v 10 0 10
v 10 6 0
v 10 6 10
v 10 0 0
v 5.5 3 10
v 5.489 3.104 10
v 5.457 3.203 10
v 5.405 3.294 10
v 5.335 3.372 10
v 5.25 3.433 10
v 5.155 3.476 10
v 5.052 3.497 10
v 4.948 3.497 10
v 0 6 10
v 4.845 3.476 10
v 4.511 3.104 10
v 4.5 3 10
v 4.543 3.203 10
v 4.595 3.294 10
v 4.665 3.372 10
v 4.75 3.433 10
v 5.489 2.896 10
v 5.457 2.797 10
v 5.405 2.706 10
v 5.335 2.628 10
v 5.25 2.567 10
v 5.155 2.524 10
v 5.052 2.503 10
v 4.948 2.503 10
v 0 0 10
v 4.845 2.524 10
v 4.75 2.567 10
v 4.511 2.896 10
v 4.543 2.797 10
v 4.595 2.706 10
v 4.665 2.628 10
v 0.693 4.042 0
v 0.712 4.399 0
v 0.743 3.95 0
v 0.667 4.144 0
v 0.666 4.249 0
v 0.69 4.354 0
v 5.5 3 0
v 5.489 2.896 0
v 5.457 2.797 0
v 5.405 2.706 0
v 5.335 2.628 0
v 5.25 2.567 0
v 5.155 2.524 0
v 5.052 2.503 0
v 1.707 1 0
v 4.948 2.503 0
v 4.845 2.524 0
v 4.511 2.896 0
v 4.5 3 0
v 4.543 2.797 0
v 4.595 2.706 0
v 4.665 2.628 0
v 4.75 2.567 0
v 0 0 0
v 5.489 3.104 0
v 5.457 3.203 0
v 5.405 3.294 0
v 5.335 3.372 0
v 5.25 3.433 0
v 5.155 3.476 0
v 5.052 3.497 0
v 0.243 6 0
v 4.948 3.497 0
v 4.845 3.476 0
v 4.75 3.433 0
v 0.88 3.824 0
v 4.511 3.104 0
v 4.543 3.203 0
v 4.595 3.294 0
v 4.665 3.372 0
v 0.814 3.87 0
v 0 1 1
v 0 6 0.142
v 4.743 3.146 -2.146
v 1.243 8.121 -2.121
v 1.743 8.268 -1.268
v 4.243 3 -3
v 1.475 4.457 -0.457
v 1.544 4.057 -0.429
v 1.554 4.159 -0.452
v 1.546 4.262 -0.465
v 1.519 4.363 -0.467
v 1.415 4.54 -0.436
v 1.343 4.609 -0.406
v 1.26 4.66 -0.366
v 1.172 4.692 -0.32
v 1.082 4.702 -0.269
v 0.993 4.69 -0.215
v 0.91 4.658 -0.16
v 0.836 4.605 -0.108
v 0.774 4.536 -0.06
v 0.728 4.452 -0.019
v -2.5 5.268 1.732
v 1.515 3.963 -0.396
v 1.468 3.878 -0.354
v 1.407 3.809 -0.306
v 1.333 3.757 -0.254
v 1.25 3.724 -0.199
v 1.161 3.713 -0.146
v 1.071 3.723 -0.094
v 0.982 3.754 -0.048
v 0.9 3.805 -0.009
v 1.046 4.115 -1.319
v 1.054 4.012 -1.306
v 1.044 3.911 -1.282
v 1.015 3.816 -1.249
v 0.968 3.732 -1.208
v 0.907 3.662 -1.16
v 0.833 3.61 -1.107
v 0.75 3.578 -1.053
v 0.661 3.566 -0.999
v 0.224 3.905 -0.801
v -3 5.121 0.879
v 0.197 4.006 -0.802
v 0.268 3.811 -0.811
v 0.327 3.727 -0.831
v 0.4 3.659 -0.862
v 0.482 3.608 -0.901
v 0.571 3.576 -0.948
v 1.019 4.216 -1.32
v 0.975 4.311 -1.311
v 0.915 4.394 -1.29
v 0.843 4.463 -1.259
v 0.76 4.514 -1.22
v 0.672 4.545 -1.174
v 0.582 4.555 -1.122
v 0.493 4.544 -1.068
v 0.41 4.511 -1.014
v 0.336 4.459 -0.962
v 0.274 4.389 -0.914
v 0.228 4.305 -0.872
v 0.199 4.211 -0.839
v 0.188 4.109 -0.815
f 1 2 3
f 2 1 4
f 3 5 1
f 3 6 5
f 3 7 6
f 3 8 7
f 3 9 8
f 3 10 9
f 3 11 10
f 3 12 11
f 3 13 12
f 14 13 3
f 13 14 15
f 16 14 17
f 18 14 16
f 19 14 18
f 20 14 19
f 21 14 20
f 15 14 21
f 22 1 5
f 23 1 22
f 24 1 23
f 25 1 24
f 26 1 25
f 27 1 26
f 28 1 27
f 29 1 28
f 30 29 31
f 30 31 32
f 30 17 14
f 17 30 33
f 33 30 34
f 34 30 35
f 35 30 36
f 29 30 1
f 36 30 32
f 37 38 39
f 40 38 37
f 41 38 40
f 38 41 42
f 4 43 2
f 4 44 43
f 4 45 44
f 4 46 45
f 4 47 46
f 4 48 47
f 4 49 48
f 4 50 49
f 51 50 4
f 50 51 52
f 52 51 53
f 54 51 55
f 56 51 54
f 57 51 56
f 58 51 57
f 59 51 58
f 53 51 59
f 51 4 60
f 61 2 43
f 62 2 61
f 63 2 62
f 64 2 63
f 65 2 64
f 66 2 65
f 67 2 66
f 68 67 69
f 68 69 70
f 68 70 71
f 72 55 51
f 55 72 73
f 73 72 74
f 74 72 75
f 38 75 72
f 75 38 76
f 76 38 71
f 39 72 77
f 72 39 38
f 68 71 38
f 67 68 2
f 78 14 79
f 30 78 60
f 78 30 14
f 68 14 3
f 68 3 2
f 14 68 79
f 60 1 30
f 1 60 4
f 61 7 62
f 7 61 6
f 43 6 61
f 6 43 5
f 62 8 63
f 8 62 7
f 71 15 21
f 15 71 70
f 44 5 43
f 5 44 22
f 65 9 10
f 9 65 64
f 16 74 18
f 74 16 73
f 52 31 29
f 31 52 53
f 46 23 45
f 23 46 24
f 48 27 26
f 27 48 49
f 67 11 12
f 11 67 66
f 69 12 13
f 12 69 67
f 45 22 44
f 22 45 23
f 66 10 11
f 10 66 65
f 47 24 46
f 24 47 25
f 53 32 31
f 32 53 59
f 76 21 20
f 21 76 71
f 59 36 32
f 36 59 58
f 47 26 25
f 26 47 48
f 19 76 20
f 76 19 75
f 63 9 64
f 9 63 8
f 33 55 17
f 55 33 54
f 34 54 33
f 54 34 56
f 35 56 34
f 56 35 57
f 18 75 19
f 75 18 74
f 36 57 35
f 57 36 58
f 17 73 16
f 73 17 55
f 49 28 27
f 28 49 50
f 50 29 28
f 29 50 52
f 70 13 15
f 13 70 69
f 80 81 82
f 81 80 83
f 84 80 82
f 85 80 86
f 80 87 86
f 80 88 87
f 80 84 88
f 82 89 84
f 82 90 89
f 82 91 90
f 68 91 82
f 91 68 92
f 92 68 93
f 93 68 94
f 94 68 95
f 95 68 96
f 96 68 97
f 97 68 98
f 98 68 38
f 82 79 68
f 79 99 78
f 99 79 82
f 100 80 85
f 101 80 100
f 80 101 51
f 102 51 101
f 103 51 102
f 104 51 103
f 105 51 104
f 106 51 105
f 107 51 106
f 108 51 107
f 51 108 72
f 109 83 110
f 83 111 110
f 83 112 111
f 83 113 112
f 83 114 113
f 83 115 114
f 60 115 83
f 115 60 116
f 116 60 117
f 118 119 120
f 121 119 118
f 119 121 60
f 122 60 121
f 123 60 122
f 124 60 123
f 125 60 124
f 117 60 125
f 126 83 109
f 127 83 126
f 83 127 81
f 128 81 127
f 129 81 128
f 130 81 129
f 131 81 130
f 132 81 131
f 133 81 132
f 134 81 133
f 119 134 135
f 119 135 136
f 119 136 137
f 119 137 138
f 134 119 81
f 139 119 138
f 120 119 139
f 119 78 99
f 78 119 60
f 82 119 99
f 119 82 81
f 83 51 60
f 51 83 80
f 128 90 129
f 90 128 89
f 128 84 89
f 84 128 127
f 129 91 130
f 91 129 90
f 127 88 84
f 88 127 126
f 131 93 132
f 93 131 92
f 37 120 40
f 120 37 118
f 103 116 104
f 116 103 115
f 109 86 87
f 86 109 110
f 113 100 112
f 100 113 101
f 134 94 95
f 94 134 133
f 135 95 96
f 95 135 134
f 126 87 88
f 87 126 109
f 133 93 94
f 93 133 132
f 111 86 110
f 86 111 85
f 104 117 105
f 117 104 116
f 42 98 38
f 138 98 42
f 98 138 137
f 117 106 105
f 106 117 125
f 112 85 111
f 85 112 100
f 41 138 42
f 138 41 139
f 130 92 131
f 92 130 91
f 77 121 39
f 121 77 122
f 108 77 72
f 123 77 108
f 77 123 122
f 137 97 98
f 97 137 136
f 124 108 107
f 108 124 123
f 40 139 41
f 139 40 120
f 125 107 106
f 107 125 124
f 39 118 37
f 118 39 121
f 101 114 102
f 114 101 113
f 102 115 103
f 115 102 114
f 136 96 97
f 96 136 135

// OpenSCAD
// this file just has some examples of the basic methods of openscad


//cube(3);// 3mm

//$fn = 30; // made of 30 different parts
//sphere(3);

//cylinder(r = 5, h = 1);

//cube([5,2,1]); // x, y, z
//cube([5,2,1], center = true); //centered

//////
//unions

//union
//cylinder(h=3, r = 3.5);
//cube([6,6,6], center=true);

// difference
//difference() {
//    cylinder(h=3, r = 3.5);
//    cube([6,6,7], center=true);
//}

// difference
//difference() {
//    cube([6,6,7], center=true);
//    cylinder(h=3, r = 3.5);
//}

// intersection
//intersection() {
//    cube([6,6,7], center=true);
//    cylinder(h=3, r = 3.5);
//}

////////
//transform

// move
//translate([1, 1, 0]) {
//    cube([5,5,1]);
//}

//scale
//scale([1, 1, 5]) {
//    //!cube([5,5,1]); // ! -> show only this model
//    cube([5,5,1]);
//}


// rotate
module plate(length, width, thickness) {//name plate
    difference() {
        cube([length, width, thickness]);
        
        translate([length/2, width/2, 0]) {
            cylinder(r = 0.5 , h = thickness, $fn = 30);
        }
    }
}

plate(10,6,10);

//rotate
rotate(a = 45, v=[0,1,1]) {
    plate(6,6,1);
   };
